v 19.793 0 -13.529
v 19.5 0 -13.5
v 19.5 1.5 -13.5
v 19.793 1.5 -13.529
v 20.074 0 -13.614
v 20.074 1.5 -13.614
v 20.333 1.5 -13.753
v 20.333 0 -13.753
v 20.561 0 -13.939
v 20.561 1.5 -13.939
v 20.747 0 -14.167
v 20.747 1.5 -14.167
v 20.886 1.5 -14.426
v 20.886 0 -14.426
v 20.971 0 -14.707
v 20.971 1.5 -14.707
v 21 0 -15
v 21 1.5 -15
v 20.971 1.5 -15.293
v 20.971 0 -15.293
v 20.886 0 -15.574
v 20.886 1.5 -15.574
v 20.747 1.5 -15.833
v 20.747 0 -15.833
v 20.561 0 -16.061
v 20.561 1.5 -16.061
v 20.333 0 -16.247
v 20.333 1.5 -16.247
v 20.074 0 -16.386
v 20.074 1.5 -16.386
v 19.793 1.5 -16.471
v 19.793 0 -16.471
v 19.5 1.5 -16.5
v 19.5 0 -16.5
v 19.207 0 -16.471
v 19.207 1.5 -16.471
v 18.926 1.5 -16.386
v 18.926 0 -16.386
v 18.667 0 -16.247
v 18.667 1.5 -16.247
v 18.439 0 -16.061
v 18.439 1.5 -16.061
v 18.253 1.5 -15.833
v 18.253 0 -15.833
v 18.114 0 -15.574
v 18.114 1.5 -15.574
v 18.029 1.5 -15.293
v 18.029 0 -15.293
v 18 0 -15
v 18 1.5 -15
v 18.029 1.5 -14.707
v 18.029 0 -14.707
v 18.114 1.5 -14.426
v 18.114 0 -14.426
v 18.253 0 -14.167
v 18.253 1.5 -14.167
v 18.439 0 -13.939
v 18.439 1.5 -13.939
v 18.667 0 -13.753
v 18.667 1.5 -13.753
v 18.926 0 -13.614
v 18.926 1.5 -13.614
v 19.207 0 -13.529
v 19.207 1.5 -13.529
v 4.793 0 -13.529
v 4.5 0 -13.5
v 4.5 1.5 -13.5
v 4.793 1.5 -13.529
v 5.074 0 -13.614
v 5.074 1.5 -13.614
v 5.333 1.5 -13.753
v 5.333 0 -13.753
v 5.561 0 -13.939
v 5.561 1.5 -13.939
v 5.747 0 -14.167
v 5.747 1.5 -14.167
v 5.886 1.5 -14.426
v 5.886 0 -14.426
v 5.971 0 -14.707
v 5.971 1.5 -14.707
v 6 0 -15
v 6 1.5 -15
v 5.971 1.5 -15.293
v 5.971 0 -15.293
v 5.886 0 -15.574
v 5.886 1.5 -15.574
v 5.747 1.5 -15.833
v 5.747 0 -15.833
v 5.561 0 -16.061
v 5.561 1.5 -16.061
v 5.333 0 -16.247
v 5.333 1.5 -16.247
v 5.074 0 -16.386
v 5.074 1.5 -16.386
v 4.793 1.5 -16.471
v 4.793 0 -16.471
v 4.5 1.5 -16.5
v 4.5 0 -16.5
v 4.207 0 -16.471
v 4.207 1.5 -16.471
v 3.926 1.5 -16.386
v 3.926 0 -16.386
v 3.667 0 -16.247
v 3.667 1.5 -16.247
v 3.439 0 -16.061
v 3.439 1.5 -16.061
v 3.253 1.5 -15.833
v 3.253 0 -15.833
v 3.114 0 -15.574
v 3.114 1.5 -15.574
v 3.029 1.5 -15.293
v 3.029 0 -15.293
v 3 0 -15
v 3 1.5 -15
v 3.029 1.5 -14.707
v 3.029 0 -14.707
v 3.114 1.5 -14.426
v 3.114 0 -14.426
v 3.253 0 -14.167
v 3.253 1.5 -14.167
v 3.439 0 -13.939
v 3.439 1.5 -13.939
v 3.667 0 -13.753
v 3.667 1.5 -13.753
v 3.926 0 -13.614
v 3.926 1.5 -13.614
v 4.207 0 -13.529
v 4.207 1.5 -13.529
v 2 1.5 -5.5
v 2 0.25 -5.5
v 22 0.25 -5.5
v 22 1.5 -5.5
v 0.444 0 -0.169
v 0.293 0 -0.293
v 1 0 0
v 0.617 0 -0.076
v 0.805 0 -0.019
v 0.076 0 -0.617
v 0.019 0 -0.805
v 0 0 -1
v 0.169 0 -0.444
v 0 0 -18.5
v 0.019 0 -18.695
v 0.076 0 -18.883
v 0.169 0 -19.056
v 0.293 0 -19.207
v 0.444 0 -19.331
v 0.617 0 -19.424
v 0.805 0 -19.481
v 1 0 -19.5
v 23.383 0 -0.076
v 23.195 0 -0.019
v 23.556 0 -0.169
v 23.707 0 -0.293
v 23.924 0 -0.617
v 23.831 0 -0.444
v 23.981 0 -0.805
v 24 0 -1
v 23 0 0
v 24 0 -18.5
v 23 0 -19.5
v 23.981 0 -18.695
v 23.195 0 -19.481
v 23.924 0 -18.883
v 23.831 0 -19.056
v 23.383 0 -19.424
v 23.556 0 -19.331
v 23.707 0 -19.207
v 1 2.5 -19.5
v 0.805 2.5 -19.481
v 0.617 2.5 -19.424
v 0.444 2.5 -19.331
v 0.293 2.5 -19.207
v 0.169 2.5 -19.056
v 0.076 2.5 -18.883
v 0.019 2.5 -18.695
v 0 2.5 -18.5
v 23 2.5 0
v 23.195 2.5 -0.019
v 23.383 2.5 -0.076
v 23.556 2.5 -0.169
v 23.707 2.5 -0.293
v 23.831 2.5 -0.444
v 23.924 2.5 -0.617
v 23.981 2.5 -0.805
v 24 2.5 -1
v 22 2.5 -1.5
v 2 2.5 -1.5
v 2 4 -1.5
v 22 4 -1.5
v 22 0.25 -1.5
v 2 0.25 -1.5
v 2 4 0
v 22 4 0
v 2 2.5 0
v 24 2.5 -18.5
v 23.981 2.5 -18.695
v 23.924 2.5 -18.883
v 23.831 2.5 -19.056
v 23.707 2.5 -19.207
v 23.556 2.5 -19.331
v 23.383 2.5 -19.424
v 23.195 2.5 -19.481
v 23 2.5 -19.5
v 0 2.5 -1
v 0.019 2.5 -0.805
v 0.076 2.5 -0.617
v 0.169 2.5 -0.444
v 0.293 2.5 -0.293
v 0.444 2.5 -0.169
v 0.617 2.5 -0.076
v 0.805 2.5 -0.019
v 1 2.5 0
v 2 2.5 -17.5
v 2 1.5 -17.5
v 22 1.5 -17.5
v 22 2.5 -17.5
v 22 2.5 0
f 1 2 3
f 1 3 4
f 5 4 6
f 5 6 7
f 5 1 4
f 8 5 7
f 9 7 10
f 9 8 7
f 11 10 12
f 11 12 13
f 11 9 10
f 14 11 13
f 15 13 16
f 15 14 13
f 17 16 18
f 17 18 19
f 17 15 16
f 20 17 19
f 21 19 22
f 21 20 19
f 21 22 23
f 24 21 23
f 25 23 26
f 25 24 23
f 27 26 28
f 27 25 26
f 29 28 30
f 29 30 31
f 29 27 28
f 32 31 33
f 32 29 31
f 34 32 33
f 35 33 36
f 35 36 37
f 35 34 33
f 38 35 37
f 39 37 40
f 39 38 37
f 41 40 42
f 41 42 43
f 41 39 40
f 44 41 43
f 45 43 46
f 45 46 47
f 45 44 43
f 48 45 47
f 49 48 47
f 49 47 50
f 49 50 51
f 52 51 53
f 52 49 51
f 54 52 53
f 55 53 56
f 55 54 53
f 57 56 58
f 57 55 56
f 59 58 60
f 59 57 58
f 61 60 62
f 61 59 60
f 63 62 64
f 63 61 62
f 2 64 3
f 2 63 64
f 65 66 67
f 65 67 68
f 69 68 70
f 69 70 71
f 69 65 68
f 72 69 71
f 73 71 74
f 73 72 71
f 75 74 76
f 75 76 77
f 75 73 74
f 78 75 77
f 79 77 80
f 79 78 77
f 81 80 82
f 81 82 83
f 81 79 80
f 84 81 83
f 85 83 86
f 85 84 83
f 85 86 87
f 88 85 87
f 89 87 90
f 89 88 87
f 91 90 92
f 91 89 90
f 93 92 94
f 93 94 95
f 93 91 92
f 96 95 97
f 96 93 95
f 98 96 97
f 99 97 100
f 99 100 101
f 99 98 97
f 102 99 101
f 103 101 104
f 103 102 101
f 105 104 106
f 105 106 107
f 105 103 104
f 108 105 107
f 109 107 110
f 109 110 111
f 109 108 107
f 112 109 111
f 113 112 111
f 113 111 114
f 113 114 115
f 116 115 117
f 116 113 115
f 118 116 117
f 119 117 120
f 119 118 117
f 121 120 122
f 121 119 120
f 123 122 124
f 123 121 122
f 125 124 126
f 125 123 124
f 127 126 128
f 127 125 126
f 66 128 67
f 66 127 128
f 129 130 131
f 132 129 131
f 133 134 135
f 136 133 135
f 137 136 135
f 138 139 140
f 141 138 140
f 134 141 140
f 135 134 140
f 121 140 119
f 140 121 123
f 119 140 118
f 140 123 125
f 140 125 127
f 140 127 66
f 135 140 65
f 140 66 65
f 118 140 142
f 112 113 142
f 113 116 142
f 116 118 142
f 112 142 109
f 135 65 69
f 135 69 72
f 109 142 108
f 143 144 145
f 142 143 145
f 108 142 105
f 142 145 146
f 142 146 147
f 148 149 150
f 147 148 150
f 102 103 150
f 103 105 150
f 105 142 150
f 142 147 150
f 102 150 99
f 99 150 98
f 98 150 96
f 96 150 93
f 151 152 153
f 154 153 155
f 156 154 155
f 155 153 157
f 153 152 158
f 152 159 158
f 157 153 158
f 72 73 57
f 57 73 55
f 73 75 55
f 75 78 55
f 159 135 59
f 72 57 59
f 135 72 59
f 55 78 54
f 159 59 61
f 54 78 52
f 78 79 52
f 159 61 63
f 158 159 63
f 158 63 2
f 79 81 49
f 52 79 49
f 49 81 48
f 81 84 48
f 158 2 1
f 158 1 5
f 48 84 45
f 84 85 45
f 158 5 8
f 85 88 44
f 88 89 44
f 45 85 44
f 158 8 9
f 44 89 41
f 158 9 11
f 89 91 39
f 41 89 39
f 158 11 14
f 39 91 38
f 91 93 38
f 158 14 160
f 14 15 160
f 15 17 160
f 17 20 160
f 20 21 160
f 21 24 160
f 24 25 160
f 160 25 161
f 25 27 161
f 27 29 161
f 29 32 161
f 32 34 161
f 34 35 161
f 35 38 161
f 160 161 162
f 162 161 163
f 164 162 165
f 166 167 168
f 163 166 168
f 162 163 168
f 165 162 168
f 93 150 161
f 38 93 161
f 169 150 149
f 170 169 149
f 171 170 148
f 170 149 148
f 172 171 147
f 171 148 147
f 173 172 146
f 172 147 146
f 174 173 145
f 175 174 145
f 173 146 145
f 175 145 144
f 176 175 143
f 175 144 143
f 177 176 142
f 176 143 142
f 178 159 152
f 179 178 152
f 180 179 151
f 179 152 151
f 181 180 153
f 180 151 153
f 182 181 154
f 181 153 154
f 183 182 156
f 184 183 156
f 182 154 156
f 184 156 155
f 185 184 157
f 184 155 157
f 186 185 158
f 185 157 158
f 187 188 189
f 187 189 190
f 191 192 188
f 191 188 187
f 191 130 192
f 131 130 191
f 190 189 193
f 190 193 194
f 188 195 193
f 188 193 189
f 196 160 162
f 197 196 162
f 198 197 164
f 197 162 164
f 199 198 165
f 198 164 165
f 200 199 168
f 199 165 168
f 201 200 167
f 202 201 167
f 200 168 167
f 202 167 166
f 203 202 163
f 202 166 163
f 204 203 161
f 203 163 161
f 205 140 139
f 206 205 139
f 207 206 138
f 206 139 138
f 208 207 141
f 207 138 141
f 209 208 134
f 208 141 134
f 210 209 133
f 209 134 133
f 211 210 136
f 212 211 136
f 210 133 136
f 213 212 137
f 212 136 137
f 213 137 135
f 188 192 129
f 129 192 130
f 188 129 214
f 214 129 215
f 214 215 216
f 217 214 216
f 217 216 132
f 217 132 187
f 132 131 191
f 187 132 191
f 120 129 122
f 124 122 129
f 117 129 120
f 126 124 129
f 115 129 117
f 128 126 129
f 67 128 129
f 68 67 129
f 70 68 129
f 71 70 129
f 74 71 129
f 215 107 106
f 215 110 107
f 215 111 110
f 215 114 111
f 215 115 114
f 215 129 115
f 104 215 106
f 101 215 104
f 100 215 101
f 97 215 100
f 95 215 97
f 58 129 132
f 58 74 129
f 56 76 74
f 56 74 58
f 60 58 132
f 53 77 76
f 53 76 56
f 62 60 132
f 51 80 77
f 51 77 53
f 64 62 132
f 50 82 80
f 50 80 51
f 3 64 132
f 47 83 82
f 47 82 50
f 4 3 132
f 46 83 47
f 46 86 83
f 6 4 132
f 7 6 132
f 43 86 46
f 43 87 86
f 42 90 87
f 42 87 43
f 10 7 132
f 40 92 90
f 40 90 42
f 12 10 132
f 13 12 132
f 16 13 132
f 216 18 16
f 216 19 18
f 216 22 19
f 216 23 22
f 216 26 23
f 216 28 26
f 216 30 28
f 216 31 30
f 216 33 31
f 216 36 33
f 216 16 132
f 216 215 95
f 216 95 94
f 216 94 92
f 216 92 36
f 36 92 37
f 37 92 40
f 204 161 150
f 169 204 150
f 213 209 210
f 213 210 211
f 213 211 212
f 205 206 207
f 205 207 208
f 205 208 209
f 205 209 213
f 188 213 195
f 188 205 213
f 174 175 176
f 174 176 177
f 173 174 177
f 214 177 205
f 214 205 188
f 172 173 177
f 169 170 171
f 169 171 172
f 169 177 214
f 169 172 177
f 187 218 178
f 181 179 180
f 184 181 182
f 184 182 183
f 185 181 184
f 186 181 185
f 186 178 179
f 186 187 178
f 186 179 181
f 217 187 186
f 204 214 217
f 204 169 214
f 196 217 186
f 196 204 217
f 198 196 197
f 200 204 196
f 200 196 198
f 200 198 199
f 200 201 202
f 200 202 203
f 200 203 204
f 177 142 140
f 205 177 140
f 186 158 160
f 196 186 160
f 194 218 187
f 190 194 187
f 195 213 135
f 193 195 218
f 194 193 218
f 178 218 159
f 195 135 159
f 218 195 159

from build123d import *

# Parameters (mm, degrees)
SKETCH3_W           = 20
SKETCH3_H           = 12
SKETCH3_R           = 1.5
BOSS_EXTRUDE2_DEPTH = 1.5
SKETCH3_5_W         = 20
SKETCH3_5_H         = 1.5
BOSS_EXTRUDE4_DEPTH = 4
SKETCH3_6_W         = 20
SKETCH3_6_H         = 4
BOSS_EXTRUDE5_DEPTH = 0.25
BOSS_EXTRUDE7_DEPTH = 2.5


with BuildPart() as part:
    # Sketch3 → Boss-Extrude2 (new body)
    with BuildSketch(Plane(origin=(0, 0, 0), x_dir=(1, 0, 0), z_dir=(0, 1, 0))):
        with Locations((12, 11.5)):
            Rectangle(SKETCH3_W, SKETCH3_H)
        with Locations((19.5, 15)):
            Circle(SKETCH3_R, mode=Mode.SUBTRACT)
        with Locations((4.5, 15)):
            Circle(SKETCH3_R, mode=Mode.SUBTRACT)
    extrude(amount=BOSS_EXTRUDE2_DEPTH)

    # Sketch3<6> → Boss-Extrude5 (add)
    with BuildSketch(Plane(origin=(0, 0, 0), x_dir=(1, 0, 0), z_dir=(0, 1, 0))):
        with Locations((12, 3.5)):
            Rectangle(SKETCH3_6_W, SKETCH3_6_H)
    extrude(amount=BOSS_EXTRUDE5_DEPTH)



with BuildPart() as body_2:
    # Sketch3<5> → Boss-Extrude4 (new body)
    with BuildSketch(Plane(origin=(0, 0, 0), x_dir=(1, 0, 0), z_dir=(0, 1, 0))):
        with Locations((12, 0.75)):
            Rectangle(SKETCH3_5_W, SKETCH3_5_H)
    extrude(amount=BOSS_EXTRUDE4_DEPTH)


with BuildPart() as part_1:
    add(part.part)

    add(body_2.part)  # Boss-Extrude7 merges body 2
    # Sketch3<8> → Boss-Extrude7 (add)
    with BuildSketch(Plane(origin=(0, 0, 0), x_dir=(1, 0, 0), z_dir=(0, 1, 0))):
        with BuildLine():
            ThreePointArc((0, 1), (0.292893219, 0.292893219), (1, 0))
            Line((1, 0), (2, 0))
            Line((2, 0), (2, 1.5))
            Line((2, 1.5), (2, 5.5))
            Line((2, 5.5), (2, 17.5))
            Line((2, 17.5), (22, 17.5))
            Line((22, 17.5), (22, 5.5))
            Line((22, 5.5), (22, 1.5))
            Line((22, 1.5), (22, 0))
            Line((22, 0), (23, 0))
            ThreePointArc((23, 0), (23.707106781, 0.292893219), (24, 1))
            Line((24, 1), (24, 18.5))
            ThreePointArc((24, 18.5), (23.707106781, 19.207106781), (23, 19.5))
            Line((23, 19.5), (1, 19.5))
            ThreePointArc((1, 19.5), (0.292893219, 19.207106781), (0, 18.5))
            Line((0, 18.5), (0, 1))
        make_face()
    extrude(amount=BOSS_EXTRUDE7_DEPTH)


solid = part_1.part
